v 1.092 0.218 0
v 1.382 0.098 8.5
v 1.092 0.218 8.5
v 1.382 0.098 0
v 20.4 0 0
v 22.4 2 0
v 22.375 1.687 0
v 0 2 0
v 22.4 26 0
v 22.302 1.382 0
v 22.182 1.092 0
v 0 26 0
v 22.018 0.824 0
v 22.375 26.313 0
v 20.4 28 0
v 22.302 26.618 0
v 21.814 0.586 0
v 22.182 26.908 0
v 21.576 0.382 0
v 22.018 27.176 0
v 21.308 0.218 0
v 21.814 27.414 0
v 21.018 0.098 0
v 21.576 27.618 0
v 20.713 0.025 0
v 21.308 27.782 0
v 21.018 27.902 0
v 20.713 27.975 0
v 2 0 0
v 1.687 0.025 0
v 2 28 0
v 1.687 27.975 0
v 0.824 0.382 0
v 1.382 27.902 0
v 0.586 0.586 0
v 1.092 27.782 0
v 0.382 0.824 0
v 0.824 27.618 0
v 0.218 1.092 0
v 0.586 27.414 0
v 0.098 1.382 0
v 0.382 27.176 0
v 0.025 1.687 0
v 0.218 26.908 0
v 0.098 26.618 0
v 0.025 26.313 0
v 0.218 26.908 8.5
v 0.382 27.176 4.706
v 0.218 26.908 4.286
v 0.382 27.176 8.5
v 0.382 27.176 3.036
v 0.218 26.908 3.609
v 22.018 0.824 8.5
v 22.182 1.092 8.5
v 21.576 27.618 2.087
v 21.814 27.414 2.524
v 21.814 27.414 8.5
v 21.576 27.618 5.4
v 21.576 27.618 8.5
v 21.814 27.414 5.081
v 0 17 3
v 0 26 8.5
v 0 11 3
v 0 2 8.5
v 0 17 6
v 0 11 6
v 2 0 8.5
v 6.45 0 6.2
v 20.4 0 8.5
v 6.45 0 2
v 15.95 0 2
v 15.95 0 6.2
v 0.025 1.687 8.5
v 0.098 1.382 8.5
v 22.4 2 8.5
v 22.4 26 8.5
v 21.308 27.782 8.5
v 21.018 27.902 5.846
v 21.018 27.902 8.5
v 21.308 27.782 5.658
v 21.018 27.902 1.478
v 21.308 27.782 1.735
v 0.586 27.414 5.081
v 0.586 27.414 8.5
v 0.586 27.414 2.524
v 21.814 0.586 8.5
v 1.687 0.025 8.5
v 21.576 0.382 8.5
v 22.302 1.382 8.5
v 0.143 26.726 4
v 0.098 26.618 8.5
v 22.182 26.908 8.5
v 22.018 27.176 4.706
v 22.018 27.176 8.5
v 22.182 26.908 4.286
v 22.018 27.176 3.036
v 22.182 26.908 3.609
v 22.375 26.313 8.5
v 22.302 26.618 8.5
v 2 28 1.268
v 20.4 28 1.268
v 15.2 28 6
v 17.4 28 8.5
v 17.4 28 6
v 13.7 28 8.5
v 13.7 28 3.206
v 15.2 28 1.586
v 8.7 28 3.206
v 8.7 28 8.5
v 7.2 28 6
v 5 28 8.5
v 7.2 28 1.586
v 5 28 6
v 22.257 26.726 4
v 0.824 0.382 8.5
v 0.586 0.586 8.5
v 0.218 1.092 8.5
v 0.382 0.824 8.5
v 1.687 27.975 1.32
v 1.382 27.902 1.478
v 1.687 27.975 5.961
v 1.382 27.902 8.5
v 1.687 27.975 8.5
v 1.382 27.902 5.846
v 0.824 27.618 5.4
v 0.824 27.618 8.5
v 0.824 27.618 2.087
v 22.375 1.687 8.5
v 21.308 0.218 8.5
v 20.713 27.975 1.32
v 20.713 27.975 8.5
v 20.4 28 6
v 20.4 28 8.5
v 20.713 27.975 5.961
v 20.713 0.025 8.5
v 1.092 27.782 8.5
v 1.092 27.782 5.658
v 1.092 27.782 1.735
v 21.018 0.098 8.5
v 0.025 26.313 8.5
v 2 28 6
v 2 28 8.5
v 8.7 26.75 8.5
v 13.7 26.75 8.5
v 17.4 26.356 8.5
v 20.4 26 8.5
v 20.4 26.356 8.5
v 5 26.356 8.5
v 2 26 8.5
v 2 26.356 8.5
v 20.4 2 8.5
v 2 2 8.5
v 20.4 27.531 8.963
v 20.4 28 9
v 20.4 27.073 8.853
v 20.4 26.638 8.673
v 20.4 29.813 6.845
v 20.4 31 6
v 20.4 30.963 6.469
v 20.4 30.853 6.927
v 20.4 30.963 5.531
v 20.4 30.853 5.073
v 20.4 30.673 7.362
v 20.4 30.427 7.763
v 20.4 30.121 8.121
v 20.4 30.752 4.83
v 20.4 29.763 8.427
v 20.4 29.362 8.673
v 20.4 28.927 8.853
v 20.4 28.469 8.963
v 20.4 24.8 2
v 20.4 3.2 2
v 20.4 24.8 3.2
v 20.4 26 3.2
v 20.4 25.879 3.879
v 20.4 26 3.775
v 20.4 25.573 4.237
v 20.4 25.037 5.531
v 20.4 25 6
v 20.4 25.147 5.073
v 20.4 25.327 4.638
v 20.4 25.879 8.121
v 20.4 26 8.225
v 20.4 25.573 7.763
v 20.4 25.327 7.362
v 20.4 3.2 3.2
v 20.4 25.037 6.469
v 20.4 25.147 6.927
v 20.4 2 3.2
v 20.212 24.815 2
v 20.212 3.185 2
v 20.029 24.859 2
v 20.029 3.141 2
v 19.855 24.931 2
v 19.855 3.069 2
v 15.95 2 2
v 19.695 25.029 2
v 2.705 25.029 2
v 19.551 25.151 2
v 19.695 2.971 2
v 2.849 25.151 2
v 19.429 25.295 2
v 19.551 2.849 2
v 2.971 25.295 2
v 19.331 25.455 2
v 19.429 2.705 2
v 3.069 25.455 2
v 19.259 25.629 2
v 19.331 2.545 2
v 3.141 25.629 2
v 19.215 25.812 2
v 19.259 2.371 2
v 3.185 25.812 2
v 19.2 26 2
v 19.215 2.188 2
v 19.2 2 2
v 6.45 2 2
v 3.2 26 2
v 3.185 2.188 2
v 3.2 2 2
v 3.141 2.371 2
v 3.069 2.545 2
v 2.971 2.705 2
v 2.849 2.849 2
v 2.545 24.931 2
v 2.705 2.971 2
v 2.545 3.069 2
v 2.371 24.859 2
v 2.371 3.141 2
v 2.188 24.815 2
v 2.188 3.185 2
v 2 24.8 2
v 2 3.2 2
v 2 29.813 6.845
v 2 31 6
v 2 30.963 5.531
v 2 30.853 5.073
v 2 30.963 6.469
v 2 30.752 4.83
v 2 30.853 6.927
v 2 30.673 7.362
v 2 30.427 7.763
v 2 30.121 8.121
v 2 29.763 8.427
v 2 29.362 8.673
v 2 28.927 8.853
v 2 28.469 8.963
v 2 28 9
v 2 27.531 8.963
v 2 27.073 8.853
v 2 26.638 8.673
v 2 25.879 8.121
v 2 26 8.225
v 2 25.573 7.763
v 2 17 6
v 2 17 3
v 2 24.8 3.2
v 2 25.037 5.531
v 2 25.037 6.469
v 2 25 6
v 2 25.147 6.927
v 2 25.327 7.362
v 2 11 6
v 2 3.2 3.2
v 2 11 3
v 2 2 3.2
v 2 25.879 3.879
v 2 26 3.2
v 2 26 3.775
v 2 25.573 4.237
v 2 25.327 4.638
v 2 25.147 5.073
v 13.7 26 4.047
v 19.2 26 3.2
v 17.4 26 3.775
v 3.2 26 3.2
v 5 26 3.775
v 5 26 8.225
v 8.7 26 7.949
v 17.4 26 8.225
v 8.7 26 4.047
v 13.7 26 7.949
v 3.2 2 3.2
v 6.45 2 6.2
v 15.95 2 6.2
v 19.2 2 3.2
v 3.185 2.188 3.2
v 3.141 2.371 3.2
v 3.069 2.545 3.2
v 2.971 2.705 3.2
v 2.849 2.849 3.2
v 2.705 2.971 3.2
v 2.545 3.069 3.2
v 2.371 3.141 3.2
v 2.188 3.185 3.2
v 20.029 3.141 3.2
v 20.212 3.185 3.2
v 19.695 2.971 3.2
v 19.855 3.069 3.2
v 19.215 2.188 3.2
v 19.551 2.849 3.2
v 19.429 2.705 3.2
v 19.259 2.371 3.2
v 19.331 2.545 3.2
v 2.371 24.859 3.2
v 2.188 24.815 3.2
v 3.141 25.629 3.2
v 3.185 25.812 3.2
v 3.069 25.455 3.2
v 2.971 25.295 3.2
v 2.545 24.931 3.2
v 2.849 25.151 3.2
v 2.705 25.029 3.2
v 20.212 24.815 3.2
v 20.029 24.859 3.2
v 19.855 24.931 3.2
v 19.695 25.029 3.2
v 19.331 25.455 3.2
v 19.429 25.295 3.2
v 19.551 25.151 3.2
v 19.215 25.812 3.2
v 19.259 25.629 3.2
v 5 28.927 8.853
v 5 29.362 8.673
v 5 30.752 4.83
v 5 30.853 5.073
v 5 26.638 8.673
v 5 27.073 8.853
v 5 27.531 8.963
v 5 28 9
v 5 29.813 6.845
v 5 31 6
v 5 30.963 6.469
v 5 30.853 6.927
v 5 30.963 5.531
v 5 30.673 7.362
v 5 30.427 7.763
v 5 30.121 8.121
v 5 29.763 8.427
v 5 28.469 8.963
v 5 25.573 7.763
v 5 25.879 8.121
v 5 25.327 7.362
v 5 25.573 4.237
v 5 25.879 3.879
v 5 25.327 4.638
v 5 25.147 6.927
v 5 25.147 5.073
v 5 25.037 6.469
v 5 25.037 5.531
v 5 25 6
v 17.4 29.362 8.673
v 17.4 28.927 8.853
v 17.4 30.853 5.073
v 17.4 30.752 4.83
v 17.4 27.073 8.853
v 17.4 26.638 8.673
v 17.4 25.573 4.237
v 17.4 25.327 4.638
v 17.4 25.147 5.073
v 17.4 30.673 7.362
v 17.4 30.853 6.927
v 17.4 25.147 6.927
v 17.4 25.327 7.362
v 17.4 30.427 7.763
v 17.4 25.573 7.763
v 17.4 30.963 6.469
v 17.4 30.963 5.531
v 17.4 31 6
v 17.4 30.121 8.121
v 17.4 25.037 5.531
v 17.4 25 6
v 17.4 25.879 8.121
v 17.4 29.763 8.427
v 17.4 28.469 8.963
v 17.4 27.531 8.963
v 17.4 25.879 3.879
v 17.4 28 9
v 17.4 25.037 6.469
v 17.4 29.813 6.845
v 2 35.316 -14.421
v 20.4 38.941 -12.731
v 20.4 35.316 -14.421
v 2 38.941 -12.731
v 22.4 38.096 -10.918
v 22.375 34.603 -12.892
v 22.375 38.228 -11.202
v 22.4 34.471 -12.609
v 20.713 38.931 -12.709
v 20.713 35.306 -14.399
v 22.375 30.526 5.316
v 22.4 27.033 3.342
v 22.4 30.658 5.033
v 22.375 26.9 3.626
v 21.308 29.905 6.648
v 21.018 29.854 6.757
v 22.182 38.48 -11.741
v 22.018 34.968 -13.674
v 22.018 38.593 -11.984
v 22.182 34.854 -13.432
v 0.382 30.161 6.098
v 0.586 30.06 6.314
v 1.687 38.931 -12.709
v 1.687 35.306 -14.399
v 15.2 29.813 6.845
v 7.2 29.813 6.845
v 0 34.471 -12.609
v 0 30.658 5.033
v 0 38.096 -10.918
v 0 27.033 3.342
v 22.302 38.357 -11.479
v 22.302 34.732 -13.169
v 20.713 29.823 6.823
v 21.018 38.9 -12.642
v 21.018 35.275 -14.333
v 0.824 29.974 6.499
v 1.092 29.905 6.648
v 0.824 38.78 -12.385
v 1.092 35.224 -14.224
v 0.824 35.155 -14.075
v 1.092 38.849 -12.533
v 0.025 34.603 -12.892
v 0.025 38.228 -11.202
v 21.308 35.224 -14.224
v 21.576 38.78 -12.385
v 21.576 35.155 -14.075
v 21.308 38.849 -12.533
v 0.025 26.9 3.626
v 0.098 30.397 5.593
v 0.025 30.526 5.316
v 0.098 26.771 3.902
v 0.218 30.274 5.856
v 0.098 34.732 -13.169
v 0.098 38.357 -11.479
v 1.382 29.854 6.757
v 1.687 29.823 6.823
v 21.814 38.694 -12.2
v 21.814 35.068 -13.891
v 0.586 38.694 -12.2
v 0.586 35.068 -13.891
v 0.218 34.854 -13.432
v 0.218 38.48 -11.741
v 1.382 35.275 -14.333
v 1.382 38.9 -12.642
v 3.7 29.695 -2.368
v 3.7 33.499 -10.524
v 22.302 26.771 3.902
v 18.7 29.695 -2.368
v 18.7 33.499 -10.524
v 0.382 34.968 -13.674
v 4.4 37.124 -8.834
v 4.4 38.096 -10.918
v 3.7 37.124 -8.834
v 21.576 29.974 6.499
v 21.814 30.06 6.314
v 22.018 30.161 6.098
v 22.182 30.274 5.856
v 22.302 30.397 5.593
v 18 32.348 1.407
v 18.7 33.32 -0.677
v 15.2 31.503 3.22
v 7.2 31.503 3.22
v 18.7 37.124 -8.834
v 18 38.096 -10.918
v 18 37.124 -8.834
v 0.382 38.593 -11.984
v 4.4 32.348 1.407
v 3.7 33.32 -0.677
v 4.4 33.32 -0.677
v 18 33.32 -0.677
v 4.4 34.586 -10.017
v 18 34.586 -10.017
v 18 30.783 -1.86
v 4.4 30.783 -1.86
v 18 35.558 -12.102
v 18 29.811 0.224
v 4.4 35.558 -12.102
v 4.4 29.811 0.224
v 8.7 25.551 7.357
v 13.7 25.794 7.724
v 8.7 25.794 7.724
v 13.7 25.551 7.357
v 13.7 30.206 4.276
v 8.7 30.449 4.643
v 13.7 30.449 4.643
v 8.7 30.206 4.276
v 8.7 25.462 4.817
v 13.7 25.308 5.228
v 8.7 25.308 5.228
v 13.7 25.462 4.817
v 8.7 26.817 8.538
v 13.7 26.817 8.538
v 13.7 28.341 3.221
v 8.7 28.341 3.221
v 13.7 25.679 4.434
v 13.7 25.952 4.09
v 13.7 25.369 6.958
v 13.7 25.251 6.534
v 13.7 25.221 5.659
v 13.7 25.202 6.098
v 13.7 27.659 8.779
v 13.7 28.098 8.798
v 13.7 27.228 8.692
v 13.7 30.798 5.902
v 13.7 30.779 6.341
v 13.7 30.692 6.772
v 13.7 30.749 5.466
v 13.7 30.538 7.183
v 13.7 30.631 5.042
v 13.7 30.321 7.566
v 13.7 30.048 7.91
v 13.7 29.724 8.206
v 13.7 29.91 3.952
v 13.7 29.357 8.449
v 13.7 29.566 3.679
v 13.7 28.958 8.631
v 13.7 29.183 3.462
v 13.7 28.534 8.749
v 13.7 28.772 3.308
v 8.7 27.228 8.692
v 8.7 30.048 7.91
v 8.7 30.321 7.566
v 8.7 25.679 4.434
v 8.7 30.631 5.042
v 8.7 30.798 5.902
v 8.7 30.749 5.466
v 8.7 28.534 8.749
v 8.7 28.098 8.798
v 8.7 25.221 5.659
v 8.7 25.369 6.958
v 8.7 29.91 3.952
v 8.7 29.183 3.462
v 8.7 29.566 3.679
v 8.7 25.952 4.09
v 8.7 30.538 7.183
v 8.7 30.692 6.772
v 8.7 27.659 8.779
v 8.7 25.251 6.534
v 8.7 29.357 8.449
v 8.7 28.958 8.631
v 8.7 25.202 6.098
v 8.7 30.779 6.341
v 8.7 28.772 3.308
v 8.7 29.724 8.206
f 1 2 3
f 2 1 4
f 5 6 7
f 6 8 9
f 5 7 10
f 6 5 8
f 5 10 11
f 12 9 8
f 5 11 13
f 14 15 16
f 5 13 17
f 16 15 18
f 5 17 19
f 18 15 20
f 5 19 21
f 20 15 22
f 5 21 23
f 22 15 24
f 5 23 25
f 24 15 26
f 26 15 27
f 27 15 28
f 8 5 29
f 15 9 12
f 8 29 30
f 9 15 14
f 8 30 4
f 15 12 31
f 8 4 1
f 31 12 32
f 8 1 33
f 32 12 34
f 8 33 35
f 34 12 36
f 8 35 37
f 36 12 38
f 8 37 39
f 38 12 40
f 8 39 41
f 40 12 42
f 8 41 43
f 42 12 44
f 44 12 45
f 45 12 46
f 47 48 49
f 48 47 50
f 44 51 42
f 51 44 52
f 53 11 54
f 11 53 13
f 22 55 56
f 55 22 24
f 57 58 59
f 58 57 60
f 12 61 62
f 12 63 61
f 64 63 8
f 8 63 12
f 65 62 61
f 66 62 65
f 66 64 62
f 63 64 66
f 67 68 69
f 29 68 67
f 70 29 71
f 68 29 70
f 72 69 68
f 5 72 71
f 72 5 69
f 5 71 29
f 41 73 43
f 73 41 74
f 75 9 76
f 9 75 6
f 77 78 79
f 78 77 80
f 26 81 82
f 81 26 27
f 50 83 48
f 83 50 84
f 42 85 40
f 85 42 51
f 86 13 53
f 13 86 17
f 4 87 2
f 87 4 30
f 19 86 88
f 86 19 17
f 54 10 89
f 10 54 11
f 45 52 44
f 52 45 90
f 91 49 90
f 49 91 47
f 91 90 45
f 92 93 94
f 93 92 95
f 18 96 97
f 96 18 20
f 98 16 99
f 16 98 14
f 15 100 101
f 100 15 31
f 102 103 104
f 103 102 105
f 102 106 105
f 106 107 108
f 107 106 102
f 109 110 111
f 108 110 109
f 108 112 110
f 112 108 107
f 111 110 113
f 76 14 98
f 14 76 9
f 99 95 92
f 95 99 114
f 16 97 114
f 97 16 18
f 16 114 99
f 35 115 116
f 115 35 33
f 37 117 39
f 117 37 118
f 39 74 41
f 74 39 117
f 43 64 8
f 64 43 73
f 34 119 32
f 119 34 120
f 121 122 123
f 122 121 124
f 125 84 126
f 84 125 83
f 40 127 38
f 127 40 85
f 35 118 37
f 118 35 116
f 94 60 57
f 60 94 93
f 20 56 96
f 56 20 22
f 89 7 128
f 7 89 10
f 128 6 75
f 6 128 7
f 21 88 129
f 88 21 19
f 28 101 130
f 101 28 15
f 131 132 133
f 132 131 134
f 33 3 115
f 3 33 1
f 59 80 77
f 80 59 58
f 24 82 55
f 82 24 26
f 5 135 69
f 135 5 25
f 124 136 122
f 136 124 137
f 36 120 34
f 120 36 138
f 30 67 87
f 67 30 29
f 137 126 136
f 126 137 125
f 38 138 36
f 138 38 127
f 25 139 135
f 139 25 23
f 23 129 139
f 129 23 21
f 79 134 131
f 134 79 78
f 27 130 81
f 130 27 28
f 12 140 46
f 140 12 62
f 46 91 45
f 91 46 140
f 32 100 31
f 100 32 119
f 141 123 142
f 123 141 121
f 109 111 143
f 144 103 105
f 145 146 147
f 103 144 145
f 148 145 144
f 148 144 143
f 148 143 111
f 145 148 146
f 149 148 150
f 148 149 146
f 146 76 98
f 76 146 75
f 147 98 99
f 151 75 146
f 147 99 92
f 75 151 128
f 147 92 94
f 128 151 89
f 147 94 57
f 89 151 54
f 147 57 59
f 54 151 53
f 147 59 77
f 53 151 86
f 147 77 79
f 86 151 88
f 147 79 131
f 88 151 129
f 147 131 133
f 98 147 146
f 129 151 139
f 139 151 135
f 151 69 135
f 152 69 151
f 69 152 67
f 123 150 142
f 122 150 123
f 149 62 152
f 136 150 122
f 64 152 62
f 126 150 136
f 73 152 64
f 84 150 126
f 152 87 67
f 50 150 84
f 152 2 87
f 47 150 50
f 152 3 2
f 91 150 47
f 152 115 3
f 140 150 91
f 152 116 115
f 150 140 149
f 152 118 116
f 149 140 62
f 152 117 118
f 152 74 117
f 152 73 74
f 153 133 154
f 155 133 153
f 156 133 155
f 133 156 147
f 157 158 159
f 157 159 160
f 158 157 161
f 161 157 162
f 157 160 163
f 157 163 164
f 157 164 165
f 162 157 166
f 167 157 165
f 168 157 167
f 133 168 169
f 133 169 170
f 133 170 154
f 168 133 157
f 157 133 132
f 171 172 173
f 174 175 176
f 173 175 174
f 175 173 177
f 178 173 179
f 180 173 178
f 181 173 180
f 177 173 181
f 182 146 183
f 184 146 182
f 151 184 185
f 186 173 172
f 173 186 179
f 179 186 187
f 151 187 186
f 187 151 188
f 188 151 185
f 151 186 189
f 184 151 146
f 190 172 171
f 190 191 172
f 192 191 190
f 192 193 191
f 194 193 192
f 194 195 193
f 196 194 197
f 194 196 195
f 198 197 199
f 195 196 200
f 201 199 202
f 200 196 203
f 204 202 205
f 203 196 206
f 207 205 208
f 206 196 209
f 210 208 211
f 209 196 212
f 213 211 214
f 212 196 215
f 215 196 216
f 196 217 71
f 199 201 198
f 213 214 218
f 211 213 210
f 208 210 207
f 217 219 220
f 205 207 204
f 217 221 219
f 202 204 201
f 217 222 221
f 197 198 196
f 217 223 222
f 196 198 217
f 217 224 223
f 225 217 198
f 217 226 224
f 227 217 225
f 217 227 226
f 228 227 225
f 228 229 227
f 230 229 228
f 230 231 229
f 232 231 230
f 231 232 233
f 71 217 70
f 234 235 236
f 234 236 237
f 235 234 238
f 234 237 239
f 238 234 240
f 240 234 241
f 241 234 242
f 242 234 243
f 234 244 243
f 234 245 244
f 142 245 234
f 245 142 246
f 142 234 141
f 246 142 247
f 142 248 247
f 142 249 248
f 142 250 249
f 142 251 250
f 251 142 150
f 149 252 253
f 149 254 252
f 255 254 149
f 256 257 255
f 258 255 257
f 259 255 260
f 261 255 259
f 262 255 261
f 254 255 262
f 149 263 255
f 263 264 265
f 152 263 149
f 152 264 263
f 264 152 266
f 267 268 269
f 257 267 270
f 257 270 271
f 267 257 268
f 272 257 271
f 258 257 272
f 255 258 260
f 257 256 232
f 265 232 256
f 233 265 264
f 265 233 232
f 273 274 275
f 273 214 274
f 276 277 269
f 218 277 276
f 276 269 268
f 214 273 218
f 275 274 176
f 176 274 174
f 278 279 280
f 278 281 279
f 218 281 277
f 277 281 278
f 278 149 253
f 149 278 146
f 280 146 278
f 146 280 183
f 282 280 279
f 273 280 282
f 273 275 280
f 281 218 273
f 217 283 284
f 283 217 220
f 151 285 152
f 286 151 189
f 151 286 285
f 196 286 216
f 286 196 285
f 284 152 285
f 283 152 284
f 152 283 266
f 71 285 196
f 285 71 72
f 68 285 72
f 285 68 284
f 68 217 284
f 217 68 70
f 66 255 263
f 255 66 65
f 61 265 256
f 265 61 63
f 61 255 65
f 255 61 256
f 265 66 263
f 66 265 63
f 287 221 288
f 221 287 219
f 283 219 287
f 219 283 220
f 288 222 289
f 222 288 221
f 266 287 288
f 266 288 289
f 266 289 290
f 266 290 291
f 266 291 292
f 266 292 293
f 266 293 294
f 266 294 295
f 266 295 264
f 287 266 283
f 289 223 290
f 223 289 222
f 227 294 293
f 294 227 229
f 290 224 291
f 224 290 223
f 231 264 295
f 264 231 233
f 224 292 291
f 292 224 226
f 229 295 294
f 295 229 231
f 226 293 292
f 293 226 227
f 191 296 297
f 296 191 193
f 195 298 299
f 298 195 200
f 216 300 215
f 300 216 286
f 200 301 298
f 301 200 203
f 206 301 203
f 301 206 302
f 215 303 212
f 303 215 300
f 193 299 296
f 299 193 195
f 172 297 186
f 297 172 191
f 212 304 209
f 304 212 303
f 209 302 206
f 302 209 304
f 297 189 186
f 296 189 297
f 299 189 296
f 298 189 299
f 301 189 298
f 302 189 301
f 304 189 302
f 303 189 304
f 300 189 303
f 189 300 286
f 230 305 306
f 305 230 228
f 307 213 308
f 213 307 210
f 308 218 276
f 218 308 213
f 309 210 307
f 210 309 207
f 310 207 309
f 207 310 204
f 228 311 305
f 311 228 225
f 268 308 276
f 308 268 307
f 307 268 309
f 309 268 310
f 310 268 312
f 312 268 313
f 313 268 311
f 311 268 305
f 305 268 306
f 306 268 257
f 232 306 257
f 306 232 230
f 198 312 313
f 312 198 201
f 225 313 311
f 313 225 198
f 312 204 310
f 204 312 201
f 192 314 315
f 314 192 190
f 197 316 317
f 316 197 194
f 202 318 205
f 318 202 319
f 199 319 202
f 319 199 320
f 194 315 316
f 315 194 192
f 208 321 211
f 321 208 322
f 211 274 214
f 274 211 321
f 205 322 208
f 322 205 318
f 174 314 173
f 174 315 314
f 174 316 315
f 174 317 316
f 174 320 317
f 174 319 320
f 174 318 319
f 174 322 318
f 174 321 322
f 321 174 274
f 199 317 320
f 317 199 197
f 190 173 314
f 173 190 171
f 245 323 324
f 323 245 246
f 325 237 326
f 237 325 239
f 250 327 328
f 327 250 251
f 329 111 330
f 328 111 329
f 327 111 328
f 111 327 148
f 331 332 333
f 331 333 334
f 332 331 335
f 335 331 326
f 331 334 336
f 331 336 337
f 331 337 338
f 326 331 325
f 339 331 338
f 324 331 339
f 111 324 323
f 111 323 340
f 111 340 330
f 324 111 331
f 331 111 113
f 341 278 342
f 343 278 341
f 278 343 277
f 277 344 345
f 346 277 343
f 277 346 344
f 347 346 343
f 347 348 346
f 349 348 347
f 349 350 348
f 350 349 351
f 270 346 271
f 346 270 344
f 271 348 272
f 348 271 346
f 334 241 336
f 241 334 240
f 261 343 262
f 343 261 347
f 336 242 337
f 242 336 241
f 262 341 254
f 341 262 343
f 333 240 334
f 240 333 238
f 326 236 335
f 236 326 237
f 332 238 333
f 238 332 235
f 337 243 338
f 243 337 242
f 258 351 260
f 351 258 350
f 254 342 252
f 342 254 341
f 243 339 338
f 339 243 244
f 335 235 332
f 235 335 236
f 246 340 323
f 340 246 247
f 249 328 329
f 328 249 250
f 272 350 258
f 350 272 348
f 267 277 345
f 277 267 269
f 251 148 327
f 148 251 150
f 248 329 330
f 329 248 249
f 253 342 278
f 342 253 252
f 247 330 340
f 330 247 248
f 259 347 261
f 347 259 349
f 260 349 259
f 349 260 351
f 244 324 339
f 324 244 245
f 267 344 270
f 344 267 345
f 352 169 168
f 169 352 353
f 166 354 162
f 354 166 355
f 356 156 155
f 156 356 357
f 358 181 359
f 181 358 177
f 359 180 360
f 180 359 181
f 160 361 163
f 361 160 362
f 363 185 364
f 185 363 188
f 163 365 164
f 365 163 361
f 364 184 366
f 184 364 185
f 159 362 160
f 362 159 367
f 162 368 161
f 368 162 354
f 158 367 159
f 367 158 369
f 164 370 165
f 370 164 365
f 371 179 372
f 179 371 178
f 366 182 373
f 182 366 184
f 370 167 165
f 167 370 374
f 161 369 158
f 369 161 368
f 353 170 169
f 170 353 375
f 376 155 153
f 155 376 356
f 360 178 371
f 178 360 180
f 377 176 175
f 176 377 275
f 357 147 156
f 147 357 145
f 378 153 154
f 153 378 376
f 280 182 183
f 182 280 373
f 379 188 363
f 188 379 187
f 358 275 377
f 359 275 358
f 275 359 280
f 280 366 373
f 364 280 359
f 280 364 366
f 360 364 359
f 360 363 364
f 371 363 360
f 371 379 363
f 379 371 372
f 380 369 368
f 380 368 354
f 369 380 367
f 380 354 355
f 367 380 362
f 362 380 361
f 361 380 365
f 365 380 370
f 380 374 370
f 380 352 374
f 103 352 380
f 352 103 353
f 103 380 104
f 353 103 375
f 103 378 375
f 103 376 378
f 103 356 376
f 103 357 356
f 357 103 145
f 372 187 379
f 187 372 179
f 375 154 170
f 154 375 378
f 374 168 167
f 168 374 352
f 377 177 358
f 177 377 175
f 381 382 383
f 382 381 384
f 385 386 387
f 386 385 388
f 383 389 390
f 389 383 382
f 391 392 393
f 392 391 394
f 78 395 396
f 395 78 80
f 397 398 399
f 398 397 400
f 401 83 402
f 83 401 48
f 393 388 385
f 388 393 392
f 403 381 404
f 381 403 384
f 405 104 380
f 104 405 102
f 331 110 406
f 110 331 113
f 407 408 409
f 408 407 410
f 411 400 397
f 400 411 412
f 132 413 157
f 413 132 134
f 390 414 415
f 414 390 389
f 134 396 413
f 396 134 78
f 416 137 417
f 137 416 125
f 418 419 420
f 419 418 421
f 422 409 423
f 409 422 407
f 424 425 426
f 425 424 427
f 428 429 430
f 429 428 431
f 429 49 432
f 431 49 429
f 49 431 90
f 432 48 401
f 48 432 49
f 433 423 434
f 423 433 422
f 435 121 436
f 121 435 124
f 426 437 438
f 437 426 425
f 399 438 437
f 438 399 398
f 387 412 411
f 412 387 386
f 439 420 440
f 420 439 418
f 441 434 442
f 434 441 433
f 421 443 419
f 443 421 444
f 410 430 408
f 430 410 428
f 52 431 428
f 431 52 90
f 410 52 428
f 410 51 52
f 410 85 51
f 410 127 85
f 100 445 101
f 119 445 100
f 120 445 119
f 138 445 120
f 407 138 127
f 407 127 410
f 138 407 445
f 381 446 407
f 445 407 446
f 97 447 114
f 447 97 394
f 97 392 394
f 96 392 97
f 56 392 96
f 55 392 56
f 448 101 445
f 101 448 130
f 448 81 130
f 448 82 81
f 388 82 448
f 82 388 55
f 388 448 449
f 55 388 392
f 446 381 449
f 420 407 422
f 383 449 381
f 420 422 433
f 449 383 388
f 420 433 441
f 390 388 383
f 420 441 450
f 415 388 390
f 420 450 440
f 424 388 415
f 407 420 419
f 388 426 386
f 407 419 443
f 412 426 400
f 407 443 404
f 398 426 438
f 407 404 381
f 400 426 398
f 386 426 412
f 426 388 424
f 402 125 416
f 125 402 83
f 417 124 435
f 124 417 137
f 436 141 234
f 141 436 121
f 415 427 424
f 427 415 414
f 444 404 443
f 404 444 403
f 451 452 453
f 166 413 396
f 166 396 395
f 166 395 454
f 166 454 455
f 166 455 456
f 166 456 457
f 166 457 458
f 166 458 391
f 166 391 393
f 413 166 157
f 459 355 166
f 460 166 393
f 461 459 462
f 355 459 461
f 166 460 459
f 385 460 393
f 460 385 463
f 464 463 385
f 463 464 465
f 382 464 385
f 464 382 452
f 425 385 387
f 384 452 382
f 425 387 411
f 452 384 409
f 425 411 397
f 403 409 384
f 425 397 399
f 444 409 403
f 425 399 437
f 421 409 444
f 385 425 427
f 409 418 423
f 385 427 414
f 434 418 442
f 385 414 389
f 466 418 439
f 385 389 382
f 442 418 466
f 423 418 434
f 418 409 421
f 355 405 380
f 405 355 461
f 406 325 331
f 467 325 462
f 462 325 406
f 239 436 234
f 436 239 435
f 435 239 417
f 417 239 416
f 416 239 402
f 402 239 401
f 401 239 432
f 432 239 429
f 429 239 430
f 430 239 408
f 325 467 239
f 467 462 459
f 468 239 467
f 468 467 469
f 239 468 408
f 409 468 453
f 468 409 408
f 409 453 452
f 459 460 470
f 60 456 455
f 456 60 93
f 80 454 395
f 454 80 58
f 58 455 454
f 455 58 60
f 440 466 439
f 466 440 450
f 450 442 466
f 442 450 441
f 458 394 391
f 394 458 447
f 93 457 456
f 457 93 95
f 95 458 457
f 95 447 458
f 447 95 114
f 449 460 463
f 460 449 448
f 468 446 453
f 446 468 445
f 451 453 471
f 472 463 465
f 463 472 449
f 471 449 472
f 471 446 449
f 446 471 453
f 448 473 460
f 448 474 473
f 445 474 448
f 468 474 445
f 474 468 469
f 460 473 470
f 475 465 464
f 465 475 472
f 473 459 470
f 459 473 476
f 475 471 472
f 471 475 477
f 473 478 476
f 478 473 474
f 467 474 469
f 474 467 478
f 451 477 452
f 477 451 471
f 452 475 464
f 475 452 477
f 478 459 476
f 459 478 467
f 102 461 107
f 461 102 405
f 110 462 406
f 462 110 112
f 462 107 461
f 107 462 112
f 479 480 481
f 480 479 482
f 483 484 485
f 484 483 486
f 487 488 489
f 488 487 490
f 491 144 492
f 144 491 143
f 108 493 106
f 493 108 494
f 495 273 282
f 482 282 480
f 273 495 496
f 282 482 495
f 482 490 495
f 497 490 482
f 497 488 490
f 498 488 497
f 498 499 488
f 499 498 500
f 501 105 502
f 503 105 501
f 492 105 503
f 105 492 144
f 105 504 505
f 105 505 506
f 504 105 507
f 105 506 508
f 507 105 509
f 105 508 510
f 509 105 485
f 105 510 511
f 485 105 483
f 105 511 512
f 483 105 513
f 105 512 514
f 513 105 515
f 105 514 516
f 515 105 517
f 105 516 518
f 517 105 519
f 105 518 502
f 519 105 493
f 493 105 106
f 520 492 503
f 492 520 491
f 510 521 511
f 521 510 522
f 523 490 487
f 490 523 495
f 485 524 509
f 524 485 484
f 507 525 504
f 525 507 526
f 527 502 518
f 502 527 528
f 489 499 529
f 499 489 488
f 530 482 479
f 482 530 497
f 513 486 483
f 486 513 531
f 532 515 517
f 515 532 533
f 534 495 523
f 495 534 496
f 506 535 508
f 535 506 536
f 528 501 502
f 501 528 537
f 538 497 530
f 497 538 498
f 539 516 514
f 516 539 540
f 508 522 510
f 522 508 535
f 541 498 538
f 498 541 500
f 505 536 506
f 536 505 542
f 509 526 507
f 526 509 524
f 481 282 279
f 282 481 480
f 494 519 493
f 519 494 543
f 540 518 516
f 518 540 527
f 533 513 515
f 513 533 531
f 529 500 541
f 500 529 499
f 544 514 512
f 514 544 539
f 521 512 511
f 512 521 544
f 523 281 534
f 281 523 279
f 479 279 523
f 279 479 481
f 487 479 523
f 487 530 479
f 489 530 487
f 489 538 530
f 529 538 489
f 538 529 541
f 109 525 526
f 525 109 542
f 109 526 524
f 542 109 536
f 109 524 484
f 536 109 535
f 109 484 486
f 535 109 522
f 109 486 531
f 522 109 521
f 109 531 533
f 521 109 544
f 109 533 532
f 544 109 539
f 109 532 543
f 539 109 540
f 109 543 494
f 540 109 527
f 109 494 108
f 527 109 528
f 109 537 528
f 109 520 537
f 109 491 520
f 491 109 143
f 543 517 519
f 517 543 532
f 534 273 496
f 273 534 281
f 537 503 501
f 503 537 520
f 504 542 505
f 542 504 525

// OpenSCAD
// ====================================================================
// ESP32-C3 Supermini 0.42" OLED Laptop-Style Case
// Parametric OpenSCAD Model for 3D Printing
// ====================================================================

/* [Render Selection] */
// Part to render: "assembly", "base", "lid", "hinge"
render_part = "assembly"; 

/* [Main Dimensions] */
pcb_width = 18.4;       // ESP32-C3 PCB width (mm) + 0.4mm clearance
pcb_length = 24.0;      // ESP32-C3 PCB length (mm) + 0.5mm clearance
pcb_thickness = 1.6;    // PCB thickness (mm)
wall_thick = 2.0;       // Enclosure wall thickness (mm)
base_height = 8.5;      // Base chassis height (mm)

/* [Display Dimensions] */
oled_width = 13.6;      // OLED glass outer width (mm)
oled_height = 13.6;     // OLED glass outer height (mm)
screen_view_w = 15.0;   // Visible screen width cutout (mm)
screen_view_h = 9.0;    // Visible screen height cutout (mm)
lid_thickness = 4.0;    // Display lid frame thickness (mm)
tilt_angle = 65;        // Laptop screen tilt angle (degrees)

/* [USB-C Cutout] */
usb_width = 9.5;        // USB-C connector cutout width (mm)
usb_height = 4.2;       // USB-C connector cutout height (mm)

$fn = 40; // Cylinder smoothness

// ====================================================================
// MODULES
// ====================================================================

// 1. ESP32-C3 Base Chassis (Laptop Keyboard Body)
module base_unit() {
    outer_w = pcb_width + (wall_thick * 2);
    outer_l = pcb_length + (wall_thick * 2);
    
    difference() {
        // Main outer box with rounded corners
        hull() {
            translate([wall_thick, wall_thick, 0])
                cylinder(r=wall_thick, h=base_height);
            translate([outer_w - wall_thick, wall_thick, 0])
                cylinder(r=wall_thick, h=base_height);
            translate([wall_thick, outer_l - wall_thick, 0])
                cylinder(r=wall_thick, h=base_height);
            translate([outer_w - wall_thick, outer_l - wall_thick, 0])
                cylinder(r=wall_thick, h=base_height);
        }
        
        // Inner cavity for PCB
        translate([wall_thick, wall_thick, wall_thick])
            cube([pcb_width, pcb_length, base_height]);
            
        // USB-C Cutout at back
        translate([(outer_w - usb_width)/2, -1, wall_thick])
            cube([usb_width, wall_thick + 2, usb_height]);
            
        // Side ventilation & reset pin access slot
        translate([-1, outer_l/2 - 3, wall_thick + 1])
            cube([wall_thick + 2, 6, 3]);
    }
    
    // Internal PCB support ledge / corner guide pins
    translate([wall_thick, wall_thick, 0]) {
        cylinder(r=1.2, h=wall_thick + 1.2);
        translate([pcb_width, 0, 0]) cylinder(r=1.2, h=wall_thick + 1.2);
        translate([0, pcb_length, 0]) cylinder(r=1.2, h=wall_thick + 1.2);
        translate([pcb_width, pcb_length, 0]) cylinder(r=1.2, h=wall_thick + 1.2);
    }
    
    // Hinge Mounting Knuckles at rear edge
    translate([wall_thick, outer_l, base_height - 2.5]) {
        rotate([0, 90, 0])
            cylinder(r=3.0, h=3);
        translate([pcb_width - 3, 0, 0])
            rotate([0, 90, 0])
                cylinder(r=3.0, h=3);
    }
}

// 2. Laptop Display Lid (Screen Bezel Frame)
module display_lid() {
    lid_w = pcb_width + (wall_thick * 2);
    lid_l = oled_height + (wall_thick * 2) + 4;
    
    difference() {
        // Outer Lid Shell with bevels
        hull() {
            translate([wall_thick, wall_thick, 0])
                cylinder(r=wall_thick, h=lid_thickness);
            translate([lid_w - wall_thick, wall_thick, 0])
                cylinder(r=wall_thick, h=lid_thickness);
            translate([wall_thick, lid_l - wall_thick, 0])
                cylinder(r=wall_thick, h=lid_thickness);
            translate([lid_w - wall_thick, lid_l - wall_thick, 0])
                cylinder(r=wall_thick, h=lid_thickness);
        }
        
        // Front Viewport Bezel Cutout
        translate([(lid_w - screen_view_w)/2, (lid_l - screen_view_h)/2 + 2, -1])
            cube([screen_view_w, screen_view_h, lid_thickness + 2]);
            
        // Inner OLED Glass Pocket (Recessed)
        translate([(lid_w - oled_width)/2, (lid_l - oled_height)/2 + 2, 1.2])
            cube([oled_width, oled_height, lid_thickness]);
            
        // Cable Pass-through Slot at hinge bottom
        translate([(lid_w - 8)/2, -1, -1])
            cube([8, wall_thick + 3, lid_thickness + 2]);
    }
    
    // Center Hinge Mounting Knuckle
    translate([lid_w/2 - 2.5, 0, lid_thickness/2]) {
        rotate([0, 90, 0])
            cylinder(r=2.8, h=5);
    }
}

// 3. Hinge Pivot Pin
module hinge_pin() {
    cylinder(r=1.3, h=pcb_width + 4);
}

// ====================================================================
// RENDER SELECTION
// ====================================================================

if (render_part == "assembly") {
    // Render Complete Laptop Assembly View
    color("#2d3748") base_unit();
    
    // Position Lid at Hinge Angle
    translate([0, pcb_length + (wall_thick * 2), base_height - 2.5])
        rotate([-tilt_angle, 0, 0])
            translate([0, 0, -lid_thickness/2])
                color("#1a202c") display_lid();
                
} else if (render_part == "base") {
    // Render Base Unit for Printing
    base_unit();
    
} else if (render_part == "lid") {
    // Render Display Lid Flat for Printing
    display_lid();
    
} else if (render_part == "hinge") {
    // Render Hinge Pin
    hinge_pin();
}
